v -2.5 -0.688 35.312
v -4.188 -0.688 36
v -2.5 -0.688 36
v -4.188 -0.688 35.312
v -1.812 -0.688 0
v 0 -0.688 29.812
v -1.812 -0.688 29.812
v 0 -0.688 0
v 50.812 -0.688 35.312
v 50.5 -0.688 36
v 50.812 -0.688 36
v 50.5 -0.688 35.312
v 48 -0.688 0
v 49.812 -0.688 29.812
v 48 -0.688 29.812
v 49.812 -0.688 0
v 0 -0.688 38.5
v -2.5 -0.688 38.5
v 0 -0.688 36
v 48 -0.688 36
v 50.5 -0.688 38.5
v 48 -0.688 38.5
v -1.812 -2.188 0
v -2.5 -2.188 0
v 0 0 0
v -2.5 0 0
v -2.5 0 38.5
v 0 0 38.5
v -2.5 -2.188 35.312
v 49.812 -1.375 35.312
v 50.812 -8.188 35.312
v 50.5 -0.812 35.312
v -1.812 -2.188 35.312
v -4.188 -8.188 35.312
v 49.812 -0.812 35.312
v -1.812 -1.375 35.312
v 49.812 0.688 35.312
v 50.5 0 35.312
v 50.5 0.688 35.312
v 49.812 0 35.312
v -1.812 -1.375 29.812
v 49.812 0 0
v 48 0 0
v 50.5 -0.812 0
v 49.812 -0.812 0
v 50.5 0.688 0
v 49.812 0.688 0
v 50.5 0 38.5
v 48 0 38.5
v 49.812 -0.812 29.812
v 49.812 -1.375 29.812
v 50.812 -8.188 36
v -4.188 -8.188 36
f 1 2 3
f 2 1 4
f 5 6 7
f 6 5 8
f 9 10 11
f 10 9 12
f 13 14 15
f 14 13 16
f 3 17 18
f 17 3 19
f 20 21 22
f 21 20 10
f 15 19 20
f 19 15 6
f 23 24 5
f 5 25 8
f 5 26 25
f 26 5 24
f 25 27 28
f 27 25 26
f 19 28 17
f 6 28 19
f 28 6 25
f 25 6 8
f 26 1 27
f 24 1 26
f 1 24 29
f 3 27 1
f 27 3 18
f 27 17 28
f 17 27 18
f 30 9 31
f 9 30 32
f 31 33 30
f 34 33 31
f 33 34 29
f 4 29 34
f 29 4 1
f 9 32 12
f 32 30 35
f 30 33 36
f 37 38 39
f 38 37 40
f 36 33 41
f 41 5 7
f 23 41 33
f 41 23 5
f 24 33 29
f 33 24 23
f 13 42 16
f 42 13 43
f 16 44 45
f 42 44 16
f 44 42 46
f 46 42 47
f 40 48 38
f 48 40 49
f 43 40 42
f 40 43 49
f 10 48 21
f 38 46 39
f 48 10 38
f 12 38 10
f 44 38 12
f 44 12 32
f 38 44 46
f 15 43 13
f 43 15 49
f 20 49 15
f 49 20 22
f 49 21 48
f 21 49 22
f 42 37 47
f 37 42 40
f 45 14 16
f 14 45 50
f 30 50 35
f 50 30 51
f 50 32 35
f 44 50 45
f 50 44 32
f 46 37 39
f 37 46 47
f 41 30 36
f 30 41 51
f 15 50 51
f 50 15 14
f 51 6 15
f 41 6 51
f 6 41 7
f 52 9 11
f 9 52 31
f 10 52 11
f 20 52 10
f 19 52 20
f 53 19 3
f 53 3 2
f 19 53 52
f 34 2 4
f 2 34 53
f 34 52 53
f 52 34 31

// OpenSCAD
X        = [1, 0, 0];
Y        = [0, 1, 0];
Z        = [0, 0, 1];
A        = "a";

t        = 11/16;
w        = 48;
oh = 1;                         // overhang of shelf ends past legs

p_h      = 38.5;                // prop height
s_h      = 36;                  // shelf height

// Each leg has two components, leg-back and leg-side.

lbl      = p_h;
lbw      = 2.5;
lb_size  = [lbl, lbw, t];

lsl      = s_h - t;
lsw      = 1.5;
ls_size  = [lsl, lsw, t];

// backboard
bbl      = w + 2 * (lbw - t);
bbw      = 5.5;
bb_size  = [bbl, bbw, t];
bb_pos   = [t - lbw, -t, s_h - t - bbw];

// shelf
shl      = bbl + 2 * t + 2 * oh;
shw      = 7.5;
sh_size  = [shl, shw, t];
sh_pos   = [-lbw - t - oh, -shw - t, s_h - t];

// Boards: size (l, w, t), position (x, y, z), orientation, color
//    lb1, lb2: leg backs
//    ls1, ls2: leg sides
//    bb: backboard
//    sh: shelf

lb1 = [lb_size, [0, 0, 0],              [X, Z],    "red"      ];
ls1 = [ls_size, [t - lbw, -t -lsw, 0],  [Y, Y, Y], "yellow"   ];
lb2 = [lb_size, [w + lbw, 0, 0],        [X, Z],    "red"      ];
ls2 = [ls_size, [w + lbw, t - lsw, 0], [Y, Y, Y], "yellow"   ];
bb  = [bb_size, bb_pos,                 [X],       "lightgrey"];
sh  = [sh_size, sh_pos,                 [],        "white"    ];

boards = [lb1, ls1, lb2, ls2, bb, sh];
//boards = [lb1, ls1, lb2, ls2, bb];

module axes() {
    d = 0.3;
    h = 10;
    color("red")
        rotate(90, Y)
            cylinder(d=d, h=h);
    color("green")
        rotate(-90, X)
            cylinder(d=d, h=h);
    color("blue")
        cylinder(d=d, h=h);
}

module rotstar(i, r) {
    // echo("rotstar", r, i);
    if (i < len(r)) {
        if (r[i] == A) {
            echo("A");
            axes();
            rotstar(i + 1, r)
                children();
        } else {
            rotate(90, r[i])
                rotstar(i + 1, r)
                    children();
        }
    } else {
        children();
    }
}

module place_board(b) {
    translate(b[1])
        rotstar(0, b[2])
            color(b[3])
                cube(b[0]);
}

for (b = boards) {
    place_board(b);
}

echo("leg back", lb_size);
echo("leg side", ls_size);
echo("backboard", bb_size);
echo("shelf", sh_size);
